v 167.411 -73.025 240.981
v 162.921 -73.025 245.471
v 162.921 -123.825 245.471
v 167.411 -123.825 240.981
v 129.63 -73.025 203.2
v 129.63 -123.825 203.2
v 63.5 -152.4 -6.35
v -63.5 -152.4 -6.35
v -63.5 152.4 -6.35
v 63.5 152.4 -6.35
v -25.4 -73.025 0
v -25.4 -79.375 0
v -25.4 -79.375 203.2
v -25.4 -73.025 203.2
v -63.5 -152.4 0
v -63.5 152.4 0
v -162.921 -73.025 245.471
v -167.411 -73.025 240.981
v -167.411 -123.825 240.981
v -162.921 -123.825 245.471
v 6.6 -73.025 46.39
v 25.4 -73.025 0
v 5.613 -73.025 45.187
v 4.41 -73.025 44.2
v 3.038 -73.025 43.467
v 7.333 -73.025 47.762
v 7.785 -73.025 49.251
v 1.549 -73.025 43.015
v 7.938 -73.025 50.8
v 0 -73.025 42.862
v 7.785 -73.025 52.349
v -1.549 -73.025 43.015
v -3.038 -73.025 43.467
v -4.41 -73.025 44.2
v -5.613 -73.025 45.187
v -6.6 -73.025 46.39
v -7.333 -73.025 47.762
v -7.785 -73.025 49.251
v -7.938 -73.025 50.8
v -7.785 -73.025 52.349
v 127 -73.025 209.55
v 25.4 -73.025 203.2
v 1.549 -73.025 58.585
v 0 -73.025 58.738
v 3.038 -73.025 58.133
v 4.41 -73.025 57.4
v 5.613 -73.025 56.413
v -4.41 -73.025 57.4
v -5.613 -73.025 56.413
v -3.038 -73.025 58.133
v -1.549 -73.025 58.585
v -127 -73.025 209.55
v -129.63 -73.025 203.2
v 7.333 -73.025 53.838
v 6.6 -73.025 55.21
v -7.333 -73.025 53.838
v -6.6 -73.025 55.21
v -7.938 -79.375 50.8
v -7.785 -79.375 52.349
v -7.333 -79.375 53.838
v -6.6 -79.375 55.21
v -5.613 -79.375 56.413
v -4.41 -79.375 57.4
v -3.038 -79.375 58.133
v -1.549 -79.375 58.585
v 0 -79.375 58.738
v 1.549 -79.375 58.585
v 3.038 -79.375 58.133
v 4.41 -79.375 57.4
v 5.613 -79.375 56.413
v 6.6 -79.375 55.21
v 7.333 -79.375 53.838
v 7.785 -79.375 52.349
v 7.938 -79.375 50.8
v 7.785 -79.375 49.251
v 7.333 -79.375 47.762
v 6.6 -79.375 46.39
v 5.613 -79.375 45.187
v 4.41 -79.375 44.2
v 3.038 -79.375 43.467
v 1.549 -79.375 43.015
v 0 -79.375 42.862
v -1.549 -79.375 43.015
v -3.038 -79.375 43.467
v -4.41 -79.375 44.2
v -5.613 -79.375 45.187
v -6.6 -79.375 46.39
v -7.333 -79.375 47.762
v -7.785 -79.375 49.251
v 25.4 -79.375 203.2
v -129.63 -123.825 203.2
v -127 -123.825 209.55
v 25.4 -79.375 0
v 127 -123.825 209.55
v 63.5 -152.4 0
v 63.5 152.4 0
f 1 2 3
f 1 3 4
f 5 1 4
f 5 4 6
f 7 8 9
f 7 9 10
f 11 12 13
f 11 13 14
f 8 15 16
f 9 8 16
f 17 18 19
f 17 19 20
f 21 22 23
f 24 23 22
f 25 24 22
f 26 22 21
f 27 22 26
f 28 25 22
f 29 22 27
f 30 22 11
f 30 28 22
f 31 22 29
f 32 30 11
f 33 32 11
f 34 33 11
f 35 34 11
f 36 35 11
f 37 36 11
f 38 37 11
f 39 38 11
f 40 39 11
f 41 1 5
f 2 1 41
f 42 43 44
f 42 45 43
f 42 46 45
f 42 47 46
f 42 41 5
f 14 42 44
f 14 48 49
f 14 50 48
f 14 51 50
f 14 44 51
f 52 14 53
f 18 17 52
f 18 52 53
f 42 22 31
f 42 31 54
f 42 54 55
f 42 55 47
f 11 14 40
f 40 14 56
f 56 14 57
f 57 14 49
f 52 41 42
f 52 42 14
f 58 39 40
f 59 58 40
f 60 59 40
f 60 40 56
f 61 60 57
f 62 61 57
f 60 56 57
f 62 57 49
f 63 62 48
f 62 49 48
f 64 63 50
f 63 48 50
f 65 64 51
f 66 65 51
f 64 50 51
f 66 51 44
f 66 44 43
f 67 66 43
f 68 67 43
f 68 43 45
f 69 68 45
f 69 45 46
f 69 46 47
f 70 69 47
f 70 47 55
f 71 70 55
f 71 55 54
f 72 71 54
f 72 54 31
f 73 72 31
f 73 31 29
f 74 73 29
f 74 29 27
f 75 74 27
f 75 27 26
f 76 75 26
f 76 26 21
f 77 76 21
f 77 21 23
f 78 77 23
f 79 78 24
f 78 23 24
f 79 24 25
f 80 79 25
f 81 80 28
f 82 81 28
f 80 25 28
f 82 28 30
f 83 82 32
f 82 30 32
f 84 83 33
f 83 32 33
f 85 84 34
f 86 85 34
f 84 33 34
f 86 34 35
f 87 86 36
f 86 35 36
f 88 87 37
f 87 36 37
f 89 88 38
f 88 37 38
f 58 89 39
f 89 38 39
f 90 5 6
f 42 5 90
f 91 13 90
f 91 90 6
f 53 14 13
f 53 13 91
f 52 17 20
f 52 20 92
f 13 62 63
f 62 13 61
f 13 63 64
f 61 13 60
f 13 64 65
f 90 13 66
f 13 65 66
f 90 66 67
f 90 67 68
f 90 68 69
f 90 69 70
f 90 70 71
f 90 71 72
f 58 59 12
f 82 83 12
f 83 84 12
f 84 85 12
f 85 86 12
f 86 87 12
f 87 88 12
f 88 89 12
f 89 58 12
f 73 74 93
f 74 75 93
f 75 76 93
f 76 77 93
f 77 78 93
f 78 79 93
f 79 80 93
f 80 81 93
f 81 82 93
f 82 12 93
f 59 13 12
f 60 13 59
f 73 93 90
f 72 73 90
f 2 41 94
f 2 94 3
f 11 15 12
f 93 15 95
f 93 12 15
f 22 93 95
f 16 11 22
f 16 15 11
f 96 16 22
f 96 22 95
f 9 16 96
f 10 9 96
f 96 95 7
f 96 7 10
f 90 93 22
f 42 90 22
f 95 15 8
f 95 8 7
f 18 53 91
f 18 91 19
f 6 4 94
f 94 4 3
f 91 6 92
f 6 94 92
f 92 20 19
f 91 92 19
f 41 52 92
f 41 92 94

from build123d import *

# Parameters (mm, degrees)
F0_W     = 127
F0_H     = 304.8
F1_DEPTH = 6.35
F2_W     = 50.8
F2_H     = 6.35
F3_DEPTH = 203.2
F5_D     = 15.875
F7_DEPTH = 50.8


with BuildPart() as f1:
    # F0 (on Top) → F1 (new body)
    with BuildSketch(Plane.XY):
        Rectangle(F0_W, F0_H)
    extrude(amount=-F1_DEPTH)

    # F2 (on face) → F3 (join)
    with BuildSketch(Plane.XY):
        with Locations((0, -76.2)):
            Rectangle(F2_W, F2_H)
    extrude(amount=F3_DEPTH)

    # F5 (through all)
    with Locations(Plane.XZ.offset(79.375)):
        with Locations((0, 50.8)):
            Hole(F5_D / 2)

    # F6 (on face) → F7 (join)
    with BuildSketch(Plane(origin=(0, -73.025, 0), x_dir=(-1, 0, 0), z_dir=(0, 1, 0))):
        Polygon((-129.630256, 203.2), (-127, 203.2), (127, 203.2), (129.630256, 203.2), (167.411153, 240.980896), (162.921024, 245.471024), (127, 209.55), (-127, 209.55), (-162.921024, 245.471024), (-167.411153, 240.980896), align=None)
    extrude(amount=-F7_DEPTH)


solid = f1.part
